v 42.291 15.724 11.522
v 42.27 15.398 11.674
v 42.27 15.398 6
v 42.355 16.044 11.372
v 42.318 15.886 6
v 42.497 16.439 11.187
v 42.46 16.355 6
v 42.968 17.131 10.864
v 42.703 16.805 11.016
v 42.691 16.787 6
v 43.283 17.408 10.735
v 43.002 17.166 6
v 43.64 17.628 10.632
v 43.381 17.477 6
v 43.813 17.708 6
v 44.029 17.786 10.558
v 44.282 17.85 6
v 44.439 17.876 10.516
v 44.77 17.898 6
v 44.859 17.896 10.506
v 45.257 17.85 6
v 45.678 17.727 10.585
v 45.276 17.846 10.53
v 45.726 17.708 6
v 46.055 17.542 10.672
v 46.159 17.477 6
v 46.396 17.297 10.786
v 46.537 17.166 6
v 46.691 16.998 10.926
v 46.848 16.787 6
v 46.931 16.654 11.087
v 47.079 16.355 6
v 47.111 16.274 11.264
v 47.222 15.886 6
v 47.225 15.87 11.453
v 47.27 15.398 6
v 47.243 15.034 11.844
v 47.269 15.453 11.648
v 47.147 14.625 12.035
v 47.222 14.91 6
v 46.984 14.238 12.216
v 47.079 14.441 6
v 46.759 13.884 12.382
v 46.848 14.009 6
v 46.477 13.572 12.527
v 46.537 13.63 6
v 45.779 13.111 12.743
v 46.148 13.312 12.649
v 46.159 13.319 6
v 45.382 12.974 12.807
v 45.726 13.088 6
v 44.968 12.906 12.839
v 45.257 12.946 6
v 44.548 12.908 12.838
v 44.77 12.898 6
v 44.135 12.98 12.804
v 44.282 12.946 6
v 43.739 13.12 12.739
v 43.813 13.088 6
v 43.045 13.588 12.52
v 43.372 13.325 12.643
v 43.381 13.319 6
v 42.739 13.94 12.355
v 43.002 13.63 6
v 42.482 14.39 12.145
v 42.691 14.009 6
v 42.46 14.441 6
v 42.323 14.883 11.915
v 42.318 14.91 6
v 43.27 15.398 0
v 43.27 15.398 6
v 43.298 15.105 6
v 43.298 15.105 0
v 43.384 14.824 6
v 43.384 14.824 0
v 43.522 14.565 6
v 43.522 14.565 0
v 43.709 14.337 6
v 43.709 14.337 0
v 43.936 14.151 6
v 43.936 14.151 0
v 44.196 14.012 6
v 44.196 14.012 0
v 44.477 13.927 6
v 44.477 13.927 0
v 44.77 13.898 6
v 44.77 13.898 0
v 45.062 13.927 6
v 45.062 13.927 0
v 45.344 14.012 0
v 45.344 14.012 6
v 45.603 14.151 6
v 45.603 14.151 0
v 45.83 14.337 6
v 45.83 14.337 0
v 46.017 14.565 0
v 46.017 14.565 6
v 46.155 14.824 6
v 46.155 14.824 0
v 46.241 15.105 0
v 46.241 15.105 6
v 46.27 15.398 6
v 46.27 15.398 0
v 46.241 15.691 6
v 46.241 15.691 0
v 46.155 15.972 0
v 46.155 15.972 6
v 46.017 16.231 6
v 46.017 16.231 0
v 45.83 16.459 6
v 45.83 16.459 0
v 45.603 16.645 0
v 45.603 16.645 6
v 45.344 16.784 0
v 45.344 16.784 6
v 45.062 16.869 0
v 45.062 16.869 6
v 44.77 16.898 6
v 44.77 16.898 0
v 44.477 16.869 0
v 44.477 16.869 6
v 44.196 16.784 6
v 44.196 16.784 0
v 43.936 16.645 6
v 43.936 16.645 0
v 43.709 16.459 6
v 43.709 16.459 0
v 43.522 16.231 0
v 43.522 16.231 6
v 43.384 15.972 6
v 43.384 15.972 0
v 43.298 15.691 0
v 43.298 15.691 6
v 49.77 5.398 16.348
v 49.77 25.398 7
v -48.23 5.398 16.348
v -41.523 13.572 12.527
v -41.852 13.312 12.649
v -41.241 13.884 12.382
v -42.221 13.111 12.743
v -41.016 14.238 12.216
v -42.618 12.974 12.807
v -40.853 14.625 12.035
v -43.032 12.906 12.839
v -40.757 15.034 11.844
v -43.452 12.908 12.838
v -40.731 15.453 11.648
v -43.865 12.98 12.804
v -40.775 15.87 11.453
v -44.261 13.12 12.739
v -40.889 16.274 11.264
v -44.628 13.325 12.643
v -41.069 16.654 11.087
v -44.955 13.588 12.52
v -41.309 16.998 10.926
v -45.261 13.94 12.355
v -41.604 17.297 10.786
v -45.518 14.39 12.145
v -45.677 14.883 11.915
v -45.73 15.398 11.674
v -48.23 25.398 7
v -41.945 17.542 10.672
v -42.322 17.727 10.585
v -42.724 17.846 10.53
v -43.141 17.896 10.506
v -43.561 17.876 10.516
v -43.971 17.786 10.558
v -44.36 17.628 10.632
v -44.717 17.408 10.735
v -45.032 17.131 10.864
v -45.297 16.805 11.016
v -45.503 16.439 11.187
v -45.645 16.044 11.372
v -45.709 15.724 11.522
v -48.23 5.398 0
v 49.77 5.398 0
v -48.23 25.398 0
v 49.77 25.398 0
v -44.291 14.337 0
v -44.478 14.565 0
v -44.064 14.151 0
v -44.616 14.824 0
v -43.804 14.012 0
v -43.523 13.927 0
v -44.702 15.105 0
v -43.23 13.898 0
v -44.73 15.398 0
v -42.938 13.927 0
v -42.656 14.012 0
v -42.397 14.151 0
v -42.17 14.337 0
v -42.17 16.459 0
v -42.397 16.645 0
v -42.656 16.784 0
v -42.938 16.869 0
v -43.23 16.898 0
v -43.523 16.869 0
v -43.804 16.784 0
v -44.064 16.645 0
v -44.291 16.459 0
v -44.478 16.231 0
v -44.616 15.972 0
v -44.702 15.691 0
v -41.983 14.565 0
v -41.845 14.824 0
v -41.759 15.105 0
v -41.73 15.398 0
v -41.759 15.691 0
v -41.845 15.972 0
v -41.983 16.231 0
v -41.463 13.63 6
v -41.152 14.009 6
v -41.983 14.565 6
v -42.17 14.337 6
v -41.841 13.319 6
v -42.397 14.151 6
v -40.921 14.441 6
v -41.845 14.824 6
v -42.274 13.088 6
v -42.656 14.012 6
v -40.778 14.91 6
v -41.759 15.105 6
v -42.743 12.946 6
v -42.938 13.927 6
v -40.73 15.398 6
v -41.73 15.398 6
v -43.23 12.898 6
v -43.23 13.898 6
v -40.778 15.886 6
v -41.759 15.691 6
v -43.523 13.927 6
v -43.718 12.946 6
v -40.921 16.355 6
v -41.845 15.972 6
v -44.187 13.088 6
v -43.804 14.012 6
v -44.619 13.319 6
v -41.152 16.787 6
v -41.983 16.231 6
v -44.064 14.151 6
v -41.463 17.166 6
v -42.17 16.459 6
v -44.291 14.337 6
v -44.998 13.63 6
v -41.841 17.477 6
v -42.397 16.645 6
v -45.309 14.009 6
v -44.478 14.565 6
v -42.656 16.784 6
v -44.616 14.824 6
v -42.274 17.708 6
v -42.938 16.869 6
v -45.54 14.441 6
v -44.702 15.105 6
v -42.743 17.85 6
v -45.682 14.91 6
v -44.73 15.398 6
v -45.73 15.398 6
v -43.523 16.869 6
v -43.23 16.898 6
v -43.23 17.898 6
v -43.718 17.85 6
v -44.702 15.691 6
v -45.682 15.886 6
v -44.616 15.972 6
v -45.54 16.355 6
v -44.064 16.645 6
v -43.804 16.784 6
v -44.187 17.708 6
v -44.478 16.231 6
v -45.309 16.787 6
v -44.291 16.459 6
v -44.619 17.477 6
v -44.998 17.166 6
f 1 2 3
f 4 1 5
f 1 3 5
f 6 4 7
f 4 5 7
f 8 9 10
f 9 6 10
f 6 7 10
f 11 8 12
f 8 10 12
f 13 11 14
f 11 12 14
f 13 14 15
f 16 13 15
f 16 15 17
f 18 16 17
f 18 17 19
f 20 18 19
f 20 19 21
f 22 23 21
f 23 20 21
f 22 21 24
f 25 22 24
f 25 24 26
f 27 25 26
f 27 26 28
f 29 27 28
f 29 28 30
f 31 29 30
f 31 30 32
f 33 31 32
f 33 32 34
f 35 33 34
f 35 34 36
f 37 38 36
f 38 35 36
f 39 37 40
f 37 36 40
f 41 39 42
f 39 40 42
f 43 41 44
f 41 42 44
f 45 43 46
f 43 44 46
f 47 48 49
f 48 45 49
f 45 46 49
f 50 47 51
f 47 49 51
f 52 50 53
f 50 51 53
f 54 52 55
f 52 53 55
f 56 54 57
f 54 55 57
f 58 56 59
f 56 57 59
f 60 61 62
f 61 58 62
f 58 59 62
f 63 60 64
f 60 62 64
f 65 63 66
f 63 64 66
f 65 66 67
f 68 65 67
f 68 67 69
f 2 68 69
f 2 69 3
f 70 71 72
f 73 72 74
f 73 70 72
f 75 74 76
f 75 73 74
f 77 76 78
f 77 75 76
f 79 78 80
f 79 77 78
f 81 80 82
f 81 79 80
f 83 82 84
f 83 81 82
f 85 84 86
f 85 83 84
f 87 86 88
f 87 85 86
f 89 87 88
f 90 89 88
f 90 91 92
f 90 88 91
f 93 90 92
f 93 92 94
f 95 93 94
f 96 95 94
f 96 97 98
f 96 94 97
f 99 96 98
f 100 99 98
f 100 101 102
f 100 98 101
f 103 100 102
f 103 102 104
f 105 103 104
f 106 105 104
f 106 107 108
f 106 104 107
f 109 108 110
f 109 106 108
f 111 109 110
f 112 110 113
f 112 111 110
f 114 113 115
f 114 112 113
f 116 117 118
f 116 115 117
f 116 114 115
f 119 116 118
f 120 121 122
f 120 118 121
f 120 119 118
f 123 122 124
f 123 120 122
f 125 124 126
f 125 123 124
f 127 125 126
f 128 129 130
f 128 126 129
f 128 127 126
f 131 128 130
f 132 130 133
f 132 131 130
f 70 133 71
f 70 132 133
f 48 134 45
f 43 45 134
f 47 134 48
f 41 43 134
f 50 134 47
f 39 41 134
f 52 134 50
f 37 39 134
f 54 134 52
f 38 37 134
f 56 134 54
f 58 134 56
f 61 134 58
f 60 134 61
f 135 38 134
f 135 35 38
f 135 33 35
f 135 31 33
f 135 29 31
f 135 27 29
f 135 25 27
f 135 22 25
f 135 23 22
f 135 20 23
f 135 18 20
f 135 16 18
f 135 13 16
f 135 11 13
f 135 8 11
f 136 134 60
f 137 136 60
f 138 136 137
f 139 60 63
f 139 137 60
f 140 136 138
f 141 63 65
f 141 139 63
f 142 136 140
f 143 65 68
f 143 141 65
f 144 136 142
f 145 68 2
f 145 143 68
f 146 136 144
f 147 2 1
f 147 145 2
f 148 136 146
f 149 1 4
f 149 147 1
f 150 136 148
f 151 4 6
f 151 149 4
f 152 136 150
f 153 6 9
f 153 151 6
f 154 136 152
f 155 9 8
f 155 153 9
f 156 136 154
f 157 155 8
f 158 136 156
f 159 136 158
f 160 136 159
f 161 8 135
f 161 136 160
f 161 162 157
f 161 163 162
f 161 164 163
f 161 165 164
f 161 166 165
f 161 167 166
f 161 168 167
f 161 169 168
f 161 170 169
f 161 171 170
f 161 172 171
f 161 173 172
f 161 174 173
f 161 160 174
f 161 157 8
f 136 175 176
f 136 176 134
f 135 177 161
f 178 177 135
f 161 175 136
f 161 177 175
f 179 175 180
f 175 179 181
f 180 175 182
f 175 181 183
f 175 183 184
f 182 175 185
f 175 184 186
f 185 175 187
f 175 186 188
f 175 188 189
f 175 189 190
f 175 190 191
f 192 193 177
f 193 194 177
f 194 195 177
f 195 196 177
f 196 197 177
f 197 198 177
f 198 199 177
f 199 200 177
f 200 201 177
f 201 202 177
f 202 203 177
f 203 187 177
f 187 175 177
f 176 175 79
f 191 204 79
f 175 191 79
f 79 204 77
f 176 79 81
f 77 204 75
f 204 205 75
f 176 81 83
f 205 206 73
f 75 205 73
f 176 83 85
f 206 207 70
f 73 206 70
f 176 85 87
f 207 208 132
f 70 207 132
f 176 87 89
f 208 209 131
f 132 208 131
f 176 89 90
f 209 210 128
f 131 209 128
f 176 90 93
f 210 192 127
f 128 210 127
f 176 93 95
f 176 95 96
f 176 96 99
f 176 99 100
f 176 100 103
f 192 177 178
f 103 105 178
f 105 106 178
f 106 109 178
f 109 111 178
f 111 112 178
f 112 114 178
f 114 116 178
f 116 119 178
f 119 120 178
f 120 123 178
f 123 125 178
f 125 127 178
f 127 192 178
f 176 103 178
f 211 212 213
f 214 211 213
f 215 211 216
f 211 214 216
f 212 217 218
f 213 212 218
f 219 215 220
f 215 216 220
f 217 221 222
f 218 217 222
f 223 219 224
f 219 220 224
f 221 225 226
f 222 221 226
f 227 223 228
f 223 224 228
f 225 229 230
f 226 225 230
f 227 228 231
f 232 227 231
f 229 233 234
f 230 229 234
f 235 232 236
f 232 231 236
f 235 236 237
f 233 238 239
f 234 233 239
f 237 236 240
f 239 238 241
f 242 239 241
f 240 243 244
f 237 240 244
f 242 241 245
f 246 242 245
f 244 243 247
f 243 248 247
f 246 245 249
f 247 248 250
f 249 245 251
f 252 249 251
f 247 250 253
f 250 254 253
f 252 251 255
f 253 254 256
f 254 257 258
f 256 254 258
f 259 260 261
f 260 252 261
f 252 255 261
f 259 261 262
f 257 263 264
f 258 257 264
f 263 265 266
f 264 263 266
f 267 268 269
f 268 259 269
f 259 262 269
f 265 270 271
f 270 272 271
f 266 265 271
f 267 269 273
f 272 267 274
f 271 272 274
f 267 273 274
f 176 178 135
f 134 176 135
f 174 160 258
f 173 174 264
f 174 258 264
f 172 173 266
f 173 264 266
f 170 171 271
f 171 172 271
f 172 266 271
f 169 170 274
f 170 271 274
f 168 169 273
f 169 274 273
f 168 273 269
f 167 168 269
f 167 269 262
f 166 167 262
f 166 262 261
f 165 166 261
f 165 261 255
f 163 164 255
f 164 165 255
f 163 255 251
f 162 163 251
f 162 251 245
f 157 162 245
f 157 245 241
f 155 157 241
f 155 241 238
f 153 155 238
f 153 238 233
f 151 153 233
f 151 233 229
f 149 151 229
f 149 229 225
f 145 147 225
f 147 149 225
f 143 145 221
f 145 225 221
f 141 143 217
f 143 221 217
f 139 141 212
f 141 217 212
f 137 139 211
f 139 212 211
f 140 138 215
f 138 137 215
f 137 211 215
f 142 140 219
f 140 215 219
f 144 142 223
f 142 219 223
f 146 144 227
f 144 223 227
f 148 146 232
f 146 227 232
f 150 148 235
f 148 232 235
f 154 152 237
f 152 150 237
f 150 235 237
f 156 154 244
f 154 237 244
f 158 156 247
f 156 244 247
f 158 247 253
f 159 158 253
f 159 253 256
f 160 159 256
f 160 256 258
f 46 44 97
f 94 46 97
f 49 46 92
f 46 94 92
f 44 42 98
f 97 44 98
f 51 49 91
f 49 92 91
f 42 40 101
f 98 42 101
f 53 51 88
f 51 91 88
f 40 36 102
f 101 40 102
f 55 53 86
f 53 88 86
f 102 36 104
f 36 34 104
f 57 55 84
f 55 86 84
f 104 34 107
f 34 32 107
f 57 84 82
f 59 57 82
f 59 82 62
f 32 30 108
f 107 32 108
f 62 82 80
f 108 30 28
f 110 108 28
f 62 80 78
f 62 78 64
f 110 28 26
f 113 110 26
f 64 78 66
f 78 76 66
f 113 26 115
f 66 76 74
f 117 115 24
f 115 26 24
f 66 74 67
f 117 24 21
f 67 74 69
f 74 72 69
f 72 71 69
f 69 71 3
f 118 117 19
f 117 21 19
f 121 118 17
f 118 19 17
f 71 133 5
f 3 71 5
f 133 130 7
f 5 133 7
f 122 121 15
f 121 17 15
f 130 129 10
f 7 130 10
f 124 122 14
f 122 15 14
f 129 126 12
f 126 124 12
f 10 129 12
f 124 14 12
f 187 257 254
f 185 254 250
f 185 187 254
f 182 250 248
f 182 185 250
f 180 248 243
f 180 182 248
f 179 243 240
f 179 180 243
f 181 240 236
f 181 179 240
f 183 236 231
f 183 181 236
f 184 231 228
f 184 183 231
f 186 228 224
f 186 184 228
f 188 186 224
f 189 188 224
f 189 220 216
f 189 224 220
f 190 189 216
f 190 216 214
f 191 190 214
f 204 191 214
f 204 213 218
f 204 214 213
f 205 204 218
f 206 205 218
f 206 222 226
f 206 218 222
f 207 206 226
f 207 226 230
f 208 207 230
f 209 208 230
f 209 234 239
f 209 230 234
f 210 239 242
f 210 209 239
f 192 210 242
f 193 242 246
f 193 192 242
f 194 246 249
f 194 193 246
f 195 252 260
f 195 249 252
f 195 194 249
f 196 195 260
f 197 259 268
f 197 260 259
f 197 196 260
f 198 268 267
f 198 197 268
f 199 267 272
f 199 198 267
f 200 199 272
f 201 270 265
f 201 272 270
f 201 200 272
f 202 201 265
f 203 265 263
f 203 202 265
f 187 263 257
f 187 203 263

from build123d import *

# Parameters (mm, degrees)
SKETCH_1_W          = 98
SKETCH_1_H          = 20
EXTRUDE_1_DEPTH     = 7
EXTRUDE_2_DEPTH     = 98
CUT_EXTRUDE_START   = -6
SKETCH_3_R          = 2.5
SKETCH_3_R_2        = 1.5
CUT_EXTRUDE_3_DEPTH = 98
SKETCH_4_R          = 1.5
CUT_EXTRUDE_6_DEPTH = 98


with BuildPart() as part:
    # 草图1 → 凸台-拉伸1 (new body)
    with BuildSketch(Plane.XY):
        with Locations((0.769633508, 15.397905759)):
            Rectangle(SKETCH_1_W, SKETCH_1_H)
    extrude(amount=EXTRUDE_1_DEPTH)

    # 草图2 → 凸台-拉伸2 (add)
    with BuildSketch(Plane.ZY.offset(48.230366492)):
        Polygon((7, 25.397905759), (7, 5.397905759), (12.864294632, 5.397905759), (16.347940075, 5.397905759), align=None)
    extrude(amount=-EXTRUDE_2_DEPTH)

    # 草图3 → 切除-拉伸3 (cut)
    # profile 1 of 2: a face of its own
    with BuildSketch(Plane(origin=(0, 0, 0), x_dir=(-1, 0, 0), z_dir=(0, 0, -1)).offset(CUT_EXTRUDE_START)):
        with Locations((-44.769633508, 15.397905759)):
            Circle(SKETCH_3_R)
    # profile 2 of 2: a face of its own
    with BuildSketch(Plane(origin=(0, 0, 0), x_dir=(-1, 0, 0), z_dir=(0, 0, -1)).offset(CUT_EXTRUDE_START)):
        with Locations((43.230366492, 15.397905759)):
            Circle(SKETCH_3_R)
        with Locations((43.230366492, 15.397905759)):
            Circle(SKETCH_3_R_2, mode=Mode.SUBTRACT)
    extrude(amount=-CUT_EXTRUDE_3_DEPTH, mode=Mode.SUBTRACT)

    # 草图4 → 切除-拉伸6 (cut)
    with BuildSketch(Plane.XY):
        with Locations(Location((-43.230366492, 15.397905759, 0), (0, 0, 180))):
            Circle(SKETCH_4_R)
        with Locations(Location((44.769633508, 15.397905759, 0), (0, 0, 180))):
            Circle(SKETCH_4_R)
    extrude(amount=CUT_EXTRUDE_6_DEPTH, mode=Mode.SUBTRACT)


solid = part.part
